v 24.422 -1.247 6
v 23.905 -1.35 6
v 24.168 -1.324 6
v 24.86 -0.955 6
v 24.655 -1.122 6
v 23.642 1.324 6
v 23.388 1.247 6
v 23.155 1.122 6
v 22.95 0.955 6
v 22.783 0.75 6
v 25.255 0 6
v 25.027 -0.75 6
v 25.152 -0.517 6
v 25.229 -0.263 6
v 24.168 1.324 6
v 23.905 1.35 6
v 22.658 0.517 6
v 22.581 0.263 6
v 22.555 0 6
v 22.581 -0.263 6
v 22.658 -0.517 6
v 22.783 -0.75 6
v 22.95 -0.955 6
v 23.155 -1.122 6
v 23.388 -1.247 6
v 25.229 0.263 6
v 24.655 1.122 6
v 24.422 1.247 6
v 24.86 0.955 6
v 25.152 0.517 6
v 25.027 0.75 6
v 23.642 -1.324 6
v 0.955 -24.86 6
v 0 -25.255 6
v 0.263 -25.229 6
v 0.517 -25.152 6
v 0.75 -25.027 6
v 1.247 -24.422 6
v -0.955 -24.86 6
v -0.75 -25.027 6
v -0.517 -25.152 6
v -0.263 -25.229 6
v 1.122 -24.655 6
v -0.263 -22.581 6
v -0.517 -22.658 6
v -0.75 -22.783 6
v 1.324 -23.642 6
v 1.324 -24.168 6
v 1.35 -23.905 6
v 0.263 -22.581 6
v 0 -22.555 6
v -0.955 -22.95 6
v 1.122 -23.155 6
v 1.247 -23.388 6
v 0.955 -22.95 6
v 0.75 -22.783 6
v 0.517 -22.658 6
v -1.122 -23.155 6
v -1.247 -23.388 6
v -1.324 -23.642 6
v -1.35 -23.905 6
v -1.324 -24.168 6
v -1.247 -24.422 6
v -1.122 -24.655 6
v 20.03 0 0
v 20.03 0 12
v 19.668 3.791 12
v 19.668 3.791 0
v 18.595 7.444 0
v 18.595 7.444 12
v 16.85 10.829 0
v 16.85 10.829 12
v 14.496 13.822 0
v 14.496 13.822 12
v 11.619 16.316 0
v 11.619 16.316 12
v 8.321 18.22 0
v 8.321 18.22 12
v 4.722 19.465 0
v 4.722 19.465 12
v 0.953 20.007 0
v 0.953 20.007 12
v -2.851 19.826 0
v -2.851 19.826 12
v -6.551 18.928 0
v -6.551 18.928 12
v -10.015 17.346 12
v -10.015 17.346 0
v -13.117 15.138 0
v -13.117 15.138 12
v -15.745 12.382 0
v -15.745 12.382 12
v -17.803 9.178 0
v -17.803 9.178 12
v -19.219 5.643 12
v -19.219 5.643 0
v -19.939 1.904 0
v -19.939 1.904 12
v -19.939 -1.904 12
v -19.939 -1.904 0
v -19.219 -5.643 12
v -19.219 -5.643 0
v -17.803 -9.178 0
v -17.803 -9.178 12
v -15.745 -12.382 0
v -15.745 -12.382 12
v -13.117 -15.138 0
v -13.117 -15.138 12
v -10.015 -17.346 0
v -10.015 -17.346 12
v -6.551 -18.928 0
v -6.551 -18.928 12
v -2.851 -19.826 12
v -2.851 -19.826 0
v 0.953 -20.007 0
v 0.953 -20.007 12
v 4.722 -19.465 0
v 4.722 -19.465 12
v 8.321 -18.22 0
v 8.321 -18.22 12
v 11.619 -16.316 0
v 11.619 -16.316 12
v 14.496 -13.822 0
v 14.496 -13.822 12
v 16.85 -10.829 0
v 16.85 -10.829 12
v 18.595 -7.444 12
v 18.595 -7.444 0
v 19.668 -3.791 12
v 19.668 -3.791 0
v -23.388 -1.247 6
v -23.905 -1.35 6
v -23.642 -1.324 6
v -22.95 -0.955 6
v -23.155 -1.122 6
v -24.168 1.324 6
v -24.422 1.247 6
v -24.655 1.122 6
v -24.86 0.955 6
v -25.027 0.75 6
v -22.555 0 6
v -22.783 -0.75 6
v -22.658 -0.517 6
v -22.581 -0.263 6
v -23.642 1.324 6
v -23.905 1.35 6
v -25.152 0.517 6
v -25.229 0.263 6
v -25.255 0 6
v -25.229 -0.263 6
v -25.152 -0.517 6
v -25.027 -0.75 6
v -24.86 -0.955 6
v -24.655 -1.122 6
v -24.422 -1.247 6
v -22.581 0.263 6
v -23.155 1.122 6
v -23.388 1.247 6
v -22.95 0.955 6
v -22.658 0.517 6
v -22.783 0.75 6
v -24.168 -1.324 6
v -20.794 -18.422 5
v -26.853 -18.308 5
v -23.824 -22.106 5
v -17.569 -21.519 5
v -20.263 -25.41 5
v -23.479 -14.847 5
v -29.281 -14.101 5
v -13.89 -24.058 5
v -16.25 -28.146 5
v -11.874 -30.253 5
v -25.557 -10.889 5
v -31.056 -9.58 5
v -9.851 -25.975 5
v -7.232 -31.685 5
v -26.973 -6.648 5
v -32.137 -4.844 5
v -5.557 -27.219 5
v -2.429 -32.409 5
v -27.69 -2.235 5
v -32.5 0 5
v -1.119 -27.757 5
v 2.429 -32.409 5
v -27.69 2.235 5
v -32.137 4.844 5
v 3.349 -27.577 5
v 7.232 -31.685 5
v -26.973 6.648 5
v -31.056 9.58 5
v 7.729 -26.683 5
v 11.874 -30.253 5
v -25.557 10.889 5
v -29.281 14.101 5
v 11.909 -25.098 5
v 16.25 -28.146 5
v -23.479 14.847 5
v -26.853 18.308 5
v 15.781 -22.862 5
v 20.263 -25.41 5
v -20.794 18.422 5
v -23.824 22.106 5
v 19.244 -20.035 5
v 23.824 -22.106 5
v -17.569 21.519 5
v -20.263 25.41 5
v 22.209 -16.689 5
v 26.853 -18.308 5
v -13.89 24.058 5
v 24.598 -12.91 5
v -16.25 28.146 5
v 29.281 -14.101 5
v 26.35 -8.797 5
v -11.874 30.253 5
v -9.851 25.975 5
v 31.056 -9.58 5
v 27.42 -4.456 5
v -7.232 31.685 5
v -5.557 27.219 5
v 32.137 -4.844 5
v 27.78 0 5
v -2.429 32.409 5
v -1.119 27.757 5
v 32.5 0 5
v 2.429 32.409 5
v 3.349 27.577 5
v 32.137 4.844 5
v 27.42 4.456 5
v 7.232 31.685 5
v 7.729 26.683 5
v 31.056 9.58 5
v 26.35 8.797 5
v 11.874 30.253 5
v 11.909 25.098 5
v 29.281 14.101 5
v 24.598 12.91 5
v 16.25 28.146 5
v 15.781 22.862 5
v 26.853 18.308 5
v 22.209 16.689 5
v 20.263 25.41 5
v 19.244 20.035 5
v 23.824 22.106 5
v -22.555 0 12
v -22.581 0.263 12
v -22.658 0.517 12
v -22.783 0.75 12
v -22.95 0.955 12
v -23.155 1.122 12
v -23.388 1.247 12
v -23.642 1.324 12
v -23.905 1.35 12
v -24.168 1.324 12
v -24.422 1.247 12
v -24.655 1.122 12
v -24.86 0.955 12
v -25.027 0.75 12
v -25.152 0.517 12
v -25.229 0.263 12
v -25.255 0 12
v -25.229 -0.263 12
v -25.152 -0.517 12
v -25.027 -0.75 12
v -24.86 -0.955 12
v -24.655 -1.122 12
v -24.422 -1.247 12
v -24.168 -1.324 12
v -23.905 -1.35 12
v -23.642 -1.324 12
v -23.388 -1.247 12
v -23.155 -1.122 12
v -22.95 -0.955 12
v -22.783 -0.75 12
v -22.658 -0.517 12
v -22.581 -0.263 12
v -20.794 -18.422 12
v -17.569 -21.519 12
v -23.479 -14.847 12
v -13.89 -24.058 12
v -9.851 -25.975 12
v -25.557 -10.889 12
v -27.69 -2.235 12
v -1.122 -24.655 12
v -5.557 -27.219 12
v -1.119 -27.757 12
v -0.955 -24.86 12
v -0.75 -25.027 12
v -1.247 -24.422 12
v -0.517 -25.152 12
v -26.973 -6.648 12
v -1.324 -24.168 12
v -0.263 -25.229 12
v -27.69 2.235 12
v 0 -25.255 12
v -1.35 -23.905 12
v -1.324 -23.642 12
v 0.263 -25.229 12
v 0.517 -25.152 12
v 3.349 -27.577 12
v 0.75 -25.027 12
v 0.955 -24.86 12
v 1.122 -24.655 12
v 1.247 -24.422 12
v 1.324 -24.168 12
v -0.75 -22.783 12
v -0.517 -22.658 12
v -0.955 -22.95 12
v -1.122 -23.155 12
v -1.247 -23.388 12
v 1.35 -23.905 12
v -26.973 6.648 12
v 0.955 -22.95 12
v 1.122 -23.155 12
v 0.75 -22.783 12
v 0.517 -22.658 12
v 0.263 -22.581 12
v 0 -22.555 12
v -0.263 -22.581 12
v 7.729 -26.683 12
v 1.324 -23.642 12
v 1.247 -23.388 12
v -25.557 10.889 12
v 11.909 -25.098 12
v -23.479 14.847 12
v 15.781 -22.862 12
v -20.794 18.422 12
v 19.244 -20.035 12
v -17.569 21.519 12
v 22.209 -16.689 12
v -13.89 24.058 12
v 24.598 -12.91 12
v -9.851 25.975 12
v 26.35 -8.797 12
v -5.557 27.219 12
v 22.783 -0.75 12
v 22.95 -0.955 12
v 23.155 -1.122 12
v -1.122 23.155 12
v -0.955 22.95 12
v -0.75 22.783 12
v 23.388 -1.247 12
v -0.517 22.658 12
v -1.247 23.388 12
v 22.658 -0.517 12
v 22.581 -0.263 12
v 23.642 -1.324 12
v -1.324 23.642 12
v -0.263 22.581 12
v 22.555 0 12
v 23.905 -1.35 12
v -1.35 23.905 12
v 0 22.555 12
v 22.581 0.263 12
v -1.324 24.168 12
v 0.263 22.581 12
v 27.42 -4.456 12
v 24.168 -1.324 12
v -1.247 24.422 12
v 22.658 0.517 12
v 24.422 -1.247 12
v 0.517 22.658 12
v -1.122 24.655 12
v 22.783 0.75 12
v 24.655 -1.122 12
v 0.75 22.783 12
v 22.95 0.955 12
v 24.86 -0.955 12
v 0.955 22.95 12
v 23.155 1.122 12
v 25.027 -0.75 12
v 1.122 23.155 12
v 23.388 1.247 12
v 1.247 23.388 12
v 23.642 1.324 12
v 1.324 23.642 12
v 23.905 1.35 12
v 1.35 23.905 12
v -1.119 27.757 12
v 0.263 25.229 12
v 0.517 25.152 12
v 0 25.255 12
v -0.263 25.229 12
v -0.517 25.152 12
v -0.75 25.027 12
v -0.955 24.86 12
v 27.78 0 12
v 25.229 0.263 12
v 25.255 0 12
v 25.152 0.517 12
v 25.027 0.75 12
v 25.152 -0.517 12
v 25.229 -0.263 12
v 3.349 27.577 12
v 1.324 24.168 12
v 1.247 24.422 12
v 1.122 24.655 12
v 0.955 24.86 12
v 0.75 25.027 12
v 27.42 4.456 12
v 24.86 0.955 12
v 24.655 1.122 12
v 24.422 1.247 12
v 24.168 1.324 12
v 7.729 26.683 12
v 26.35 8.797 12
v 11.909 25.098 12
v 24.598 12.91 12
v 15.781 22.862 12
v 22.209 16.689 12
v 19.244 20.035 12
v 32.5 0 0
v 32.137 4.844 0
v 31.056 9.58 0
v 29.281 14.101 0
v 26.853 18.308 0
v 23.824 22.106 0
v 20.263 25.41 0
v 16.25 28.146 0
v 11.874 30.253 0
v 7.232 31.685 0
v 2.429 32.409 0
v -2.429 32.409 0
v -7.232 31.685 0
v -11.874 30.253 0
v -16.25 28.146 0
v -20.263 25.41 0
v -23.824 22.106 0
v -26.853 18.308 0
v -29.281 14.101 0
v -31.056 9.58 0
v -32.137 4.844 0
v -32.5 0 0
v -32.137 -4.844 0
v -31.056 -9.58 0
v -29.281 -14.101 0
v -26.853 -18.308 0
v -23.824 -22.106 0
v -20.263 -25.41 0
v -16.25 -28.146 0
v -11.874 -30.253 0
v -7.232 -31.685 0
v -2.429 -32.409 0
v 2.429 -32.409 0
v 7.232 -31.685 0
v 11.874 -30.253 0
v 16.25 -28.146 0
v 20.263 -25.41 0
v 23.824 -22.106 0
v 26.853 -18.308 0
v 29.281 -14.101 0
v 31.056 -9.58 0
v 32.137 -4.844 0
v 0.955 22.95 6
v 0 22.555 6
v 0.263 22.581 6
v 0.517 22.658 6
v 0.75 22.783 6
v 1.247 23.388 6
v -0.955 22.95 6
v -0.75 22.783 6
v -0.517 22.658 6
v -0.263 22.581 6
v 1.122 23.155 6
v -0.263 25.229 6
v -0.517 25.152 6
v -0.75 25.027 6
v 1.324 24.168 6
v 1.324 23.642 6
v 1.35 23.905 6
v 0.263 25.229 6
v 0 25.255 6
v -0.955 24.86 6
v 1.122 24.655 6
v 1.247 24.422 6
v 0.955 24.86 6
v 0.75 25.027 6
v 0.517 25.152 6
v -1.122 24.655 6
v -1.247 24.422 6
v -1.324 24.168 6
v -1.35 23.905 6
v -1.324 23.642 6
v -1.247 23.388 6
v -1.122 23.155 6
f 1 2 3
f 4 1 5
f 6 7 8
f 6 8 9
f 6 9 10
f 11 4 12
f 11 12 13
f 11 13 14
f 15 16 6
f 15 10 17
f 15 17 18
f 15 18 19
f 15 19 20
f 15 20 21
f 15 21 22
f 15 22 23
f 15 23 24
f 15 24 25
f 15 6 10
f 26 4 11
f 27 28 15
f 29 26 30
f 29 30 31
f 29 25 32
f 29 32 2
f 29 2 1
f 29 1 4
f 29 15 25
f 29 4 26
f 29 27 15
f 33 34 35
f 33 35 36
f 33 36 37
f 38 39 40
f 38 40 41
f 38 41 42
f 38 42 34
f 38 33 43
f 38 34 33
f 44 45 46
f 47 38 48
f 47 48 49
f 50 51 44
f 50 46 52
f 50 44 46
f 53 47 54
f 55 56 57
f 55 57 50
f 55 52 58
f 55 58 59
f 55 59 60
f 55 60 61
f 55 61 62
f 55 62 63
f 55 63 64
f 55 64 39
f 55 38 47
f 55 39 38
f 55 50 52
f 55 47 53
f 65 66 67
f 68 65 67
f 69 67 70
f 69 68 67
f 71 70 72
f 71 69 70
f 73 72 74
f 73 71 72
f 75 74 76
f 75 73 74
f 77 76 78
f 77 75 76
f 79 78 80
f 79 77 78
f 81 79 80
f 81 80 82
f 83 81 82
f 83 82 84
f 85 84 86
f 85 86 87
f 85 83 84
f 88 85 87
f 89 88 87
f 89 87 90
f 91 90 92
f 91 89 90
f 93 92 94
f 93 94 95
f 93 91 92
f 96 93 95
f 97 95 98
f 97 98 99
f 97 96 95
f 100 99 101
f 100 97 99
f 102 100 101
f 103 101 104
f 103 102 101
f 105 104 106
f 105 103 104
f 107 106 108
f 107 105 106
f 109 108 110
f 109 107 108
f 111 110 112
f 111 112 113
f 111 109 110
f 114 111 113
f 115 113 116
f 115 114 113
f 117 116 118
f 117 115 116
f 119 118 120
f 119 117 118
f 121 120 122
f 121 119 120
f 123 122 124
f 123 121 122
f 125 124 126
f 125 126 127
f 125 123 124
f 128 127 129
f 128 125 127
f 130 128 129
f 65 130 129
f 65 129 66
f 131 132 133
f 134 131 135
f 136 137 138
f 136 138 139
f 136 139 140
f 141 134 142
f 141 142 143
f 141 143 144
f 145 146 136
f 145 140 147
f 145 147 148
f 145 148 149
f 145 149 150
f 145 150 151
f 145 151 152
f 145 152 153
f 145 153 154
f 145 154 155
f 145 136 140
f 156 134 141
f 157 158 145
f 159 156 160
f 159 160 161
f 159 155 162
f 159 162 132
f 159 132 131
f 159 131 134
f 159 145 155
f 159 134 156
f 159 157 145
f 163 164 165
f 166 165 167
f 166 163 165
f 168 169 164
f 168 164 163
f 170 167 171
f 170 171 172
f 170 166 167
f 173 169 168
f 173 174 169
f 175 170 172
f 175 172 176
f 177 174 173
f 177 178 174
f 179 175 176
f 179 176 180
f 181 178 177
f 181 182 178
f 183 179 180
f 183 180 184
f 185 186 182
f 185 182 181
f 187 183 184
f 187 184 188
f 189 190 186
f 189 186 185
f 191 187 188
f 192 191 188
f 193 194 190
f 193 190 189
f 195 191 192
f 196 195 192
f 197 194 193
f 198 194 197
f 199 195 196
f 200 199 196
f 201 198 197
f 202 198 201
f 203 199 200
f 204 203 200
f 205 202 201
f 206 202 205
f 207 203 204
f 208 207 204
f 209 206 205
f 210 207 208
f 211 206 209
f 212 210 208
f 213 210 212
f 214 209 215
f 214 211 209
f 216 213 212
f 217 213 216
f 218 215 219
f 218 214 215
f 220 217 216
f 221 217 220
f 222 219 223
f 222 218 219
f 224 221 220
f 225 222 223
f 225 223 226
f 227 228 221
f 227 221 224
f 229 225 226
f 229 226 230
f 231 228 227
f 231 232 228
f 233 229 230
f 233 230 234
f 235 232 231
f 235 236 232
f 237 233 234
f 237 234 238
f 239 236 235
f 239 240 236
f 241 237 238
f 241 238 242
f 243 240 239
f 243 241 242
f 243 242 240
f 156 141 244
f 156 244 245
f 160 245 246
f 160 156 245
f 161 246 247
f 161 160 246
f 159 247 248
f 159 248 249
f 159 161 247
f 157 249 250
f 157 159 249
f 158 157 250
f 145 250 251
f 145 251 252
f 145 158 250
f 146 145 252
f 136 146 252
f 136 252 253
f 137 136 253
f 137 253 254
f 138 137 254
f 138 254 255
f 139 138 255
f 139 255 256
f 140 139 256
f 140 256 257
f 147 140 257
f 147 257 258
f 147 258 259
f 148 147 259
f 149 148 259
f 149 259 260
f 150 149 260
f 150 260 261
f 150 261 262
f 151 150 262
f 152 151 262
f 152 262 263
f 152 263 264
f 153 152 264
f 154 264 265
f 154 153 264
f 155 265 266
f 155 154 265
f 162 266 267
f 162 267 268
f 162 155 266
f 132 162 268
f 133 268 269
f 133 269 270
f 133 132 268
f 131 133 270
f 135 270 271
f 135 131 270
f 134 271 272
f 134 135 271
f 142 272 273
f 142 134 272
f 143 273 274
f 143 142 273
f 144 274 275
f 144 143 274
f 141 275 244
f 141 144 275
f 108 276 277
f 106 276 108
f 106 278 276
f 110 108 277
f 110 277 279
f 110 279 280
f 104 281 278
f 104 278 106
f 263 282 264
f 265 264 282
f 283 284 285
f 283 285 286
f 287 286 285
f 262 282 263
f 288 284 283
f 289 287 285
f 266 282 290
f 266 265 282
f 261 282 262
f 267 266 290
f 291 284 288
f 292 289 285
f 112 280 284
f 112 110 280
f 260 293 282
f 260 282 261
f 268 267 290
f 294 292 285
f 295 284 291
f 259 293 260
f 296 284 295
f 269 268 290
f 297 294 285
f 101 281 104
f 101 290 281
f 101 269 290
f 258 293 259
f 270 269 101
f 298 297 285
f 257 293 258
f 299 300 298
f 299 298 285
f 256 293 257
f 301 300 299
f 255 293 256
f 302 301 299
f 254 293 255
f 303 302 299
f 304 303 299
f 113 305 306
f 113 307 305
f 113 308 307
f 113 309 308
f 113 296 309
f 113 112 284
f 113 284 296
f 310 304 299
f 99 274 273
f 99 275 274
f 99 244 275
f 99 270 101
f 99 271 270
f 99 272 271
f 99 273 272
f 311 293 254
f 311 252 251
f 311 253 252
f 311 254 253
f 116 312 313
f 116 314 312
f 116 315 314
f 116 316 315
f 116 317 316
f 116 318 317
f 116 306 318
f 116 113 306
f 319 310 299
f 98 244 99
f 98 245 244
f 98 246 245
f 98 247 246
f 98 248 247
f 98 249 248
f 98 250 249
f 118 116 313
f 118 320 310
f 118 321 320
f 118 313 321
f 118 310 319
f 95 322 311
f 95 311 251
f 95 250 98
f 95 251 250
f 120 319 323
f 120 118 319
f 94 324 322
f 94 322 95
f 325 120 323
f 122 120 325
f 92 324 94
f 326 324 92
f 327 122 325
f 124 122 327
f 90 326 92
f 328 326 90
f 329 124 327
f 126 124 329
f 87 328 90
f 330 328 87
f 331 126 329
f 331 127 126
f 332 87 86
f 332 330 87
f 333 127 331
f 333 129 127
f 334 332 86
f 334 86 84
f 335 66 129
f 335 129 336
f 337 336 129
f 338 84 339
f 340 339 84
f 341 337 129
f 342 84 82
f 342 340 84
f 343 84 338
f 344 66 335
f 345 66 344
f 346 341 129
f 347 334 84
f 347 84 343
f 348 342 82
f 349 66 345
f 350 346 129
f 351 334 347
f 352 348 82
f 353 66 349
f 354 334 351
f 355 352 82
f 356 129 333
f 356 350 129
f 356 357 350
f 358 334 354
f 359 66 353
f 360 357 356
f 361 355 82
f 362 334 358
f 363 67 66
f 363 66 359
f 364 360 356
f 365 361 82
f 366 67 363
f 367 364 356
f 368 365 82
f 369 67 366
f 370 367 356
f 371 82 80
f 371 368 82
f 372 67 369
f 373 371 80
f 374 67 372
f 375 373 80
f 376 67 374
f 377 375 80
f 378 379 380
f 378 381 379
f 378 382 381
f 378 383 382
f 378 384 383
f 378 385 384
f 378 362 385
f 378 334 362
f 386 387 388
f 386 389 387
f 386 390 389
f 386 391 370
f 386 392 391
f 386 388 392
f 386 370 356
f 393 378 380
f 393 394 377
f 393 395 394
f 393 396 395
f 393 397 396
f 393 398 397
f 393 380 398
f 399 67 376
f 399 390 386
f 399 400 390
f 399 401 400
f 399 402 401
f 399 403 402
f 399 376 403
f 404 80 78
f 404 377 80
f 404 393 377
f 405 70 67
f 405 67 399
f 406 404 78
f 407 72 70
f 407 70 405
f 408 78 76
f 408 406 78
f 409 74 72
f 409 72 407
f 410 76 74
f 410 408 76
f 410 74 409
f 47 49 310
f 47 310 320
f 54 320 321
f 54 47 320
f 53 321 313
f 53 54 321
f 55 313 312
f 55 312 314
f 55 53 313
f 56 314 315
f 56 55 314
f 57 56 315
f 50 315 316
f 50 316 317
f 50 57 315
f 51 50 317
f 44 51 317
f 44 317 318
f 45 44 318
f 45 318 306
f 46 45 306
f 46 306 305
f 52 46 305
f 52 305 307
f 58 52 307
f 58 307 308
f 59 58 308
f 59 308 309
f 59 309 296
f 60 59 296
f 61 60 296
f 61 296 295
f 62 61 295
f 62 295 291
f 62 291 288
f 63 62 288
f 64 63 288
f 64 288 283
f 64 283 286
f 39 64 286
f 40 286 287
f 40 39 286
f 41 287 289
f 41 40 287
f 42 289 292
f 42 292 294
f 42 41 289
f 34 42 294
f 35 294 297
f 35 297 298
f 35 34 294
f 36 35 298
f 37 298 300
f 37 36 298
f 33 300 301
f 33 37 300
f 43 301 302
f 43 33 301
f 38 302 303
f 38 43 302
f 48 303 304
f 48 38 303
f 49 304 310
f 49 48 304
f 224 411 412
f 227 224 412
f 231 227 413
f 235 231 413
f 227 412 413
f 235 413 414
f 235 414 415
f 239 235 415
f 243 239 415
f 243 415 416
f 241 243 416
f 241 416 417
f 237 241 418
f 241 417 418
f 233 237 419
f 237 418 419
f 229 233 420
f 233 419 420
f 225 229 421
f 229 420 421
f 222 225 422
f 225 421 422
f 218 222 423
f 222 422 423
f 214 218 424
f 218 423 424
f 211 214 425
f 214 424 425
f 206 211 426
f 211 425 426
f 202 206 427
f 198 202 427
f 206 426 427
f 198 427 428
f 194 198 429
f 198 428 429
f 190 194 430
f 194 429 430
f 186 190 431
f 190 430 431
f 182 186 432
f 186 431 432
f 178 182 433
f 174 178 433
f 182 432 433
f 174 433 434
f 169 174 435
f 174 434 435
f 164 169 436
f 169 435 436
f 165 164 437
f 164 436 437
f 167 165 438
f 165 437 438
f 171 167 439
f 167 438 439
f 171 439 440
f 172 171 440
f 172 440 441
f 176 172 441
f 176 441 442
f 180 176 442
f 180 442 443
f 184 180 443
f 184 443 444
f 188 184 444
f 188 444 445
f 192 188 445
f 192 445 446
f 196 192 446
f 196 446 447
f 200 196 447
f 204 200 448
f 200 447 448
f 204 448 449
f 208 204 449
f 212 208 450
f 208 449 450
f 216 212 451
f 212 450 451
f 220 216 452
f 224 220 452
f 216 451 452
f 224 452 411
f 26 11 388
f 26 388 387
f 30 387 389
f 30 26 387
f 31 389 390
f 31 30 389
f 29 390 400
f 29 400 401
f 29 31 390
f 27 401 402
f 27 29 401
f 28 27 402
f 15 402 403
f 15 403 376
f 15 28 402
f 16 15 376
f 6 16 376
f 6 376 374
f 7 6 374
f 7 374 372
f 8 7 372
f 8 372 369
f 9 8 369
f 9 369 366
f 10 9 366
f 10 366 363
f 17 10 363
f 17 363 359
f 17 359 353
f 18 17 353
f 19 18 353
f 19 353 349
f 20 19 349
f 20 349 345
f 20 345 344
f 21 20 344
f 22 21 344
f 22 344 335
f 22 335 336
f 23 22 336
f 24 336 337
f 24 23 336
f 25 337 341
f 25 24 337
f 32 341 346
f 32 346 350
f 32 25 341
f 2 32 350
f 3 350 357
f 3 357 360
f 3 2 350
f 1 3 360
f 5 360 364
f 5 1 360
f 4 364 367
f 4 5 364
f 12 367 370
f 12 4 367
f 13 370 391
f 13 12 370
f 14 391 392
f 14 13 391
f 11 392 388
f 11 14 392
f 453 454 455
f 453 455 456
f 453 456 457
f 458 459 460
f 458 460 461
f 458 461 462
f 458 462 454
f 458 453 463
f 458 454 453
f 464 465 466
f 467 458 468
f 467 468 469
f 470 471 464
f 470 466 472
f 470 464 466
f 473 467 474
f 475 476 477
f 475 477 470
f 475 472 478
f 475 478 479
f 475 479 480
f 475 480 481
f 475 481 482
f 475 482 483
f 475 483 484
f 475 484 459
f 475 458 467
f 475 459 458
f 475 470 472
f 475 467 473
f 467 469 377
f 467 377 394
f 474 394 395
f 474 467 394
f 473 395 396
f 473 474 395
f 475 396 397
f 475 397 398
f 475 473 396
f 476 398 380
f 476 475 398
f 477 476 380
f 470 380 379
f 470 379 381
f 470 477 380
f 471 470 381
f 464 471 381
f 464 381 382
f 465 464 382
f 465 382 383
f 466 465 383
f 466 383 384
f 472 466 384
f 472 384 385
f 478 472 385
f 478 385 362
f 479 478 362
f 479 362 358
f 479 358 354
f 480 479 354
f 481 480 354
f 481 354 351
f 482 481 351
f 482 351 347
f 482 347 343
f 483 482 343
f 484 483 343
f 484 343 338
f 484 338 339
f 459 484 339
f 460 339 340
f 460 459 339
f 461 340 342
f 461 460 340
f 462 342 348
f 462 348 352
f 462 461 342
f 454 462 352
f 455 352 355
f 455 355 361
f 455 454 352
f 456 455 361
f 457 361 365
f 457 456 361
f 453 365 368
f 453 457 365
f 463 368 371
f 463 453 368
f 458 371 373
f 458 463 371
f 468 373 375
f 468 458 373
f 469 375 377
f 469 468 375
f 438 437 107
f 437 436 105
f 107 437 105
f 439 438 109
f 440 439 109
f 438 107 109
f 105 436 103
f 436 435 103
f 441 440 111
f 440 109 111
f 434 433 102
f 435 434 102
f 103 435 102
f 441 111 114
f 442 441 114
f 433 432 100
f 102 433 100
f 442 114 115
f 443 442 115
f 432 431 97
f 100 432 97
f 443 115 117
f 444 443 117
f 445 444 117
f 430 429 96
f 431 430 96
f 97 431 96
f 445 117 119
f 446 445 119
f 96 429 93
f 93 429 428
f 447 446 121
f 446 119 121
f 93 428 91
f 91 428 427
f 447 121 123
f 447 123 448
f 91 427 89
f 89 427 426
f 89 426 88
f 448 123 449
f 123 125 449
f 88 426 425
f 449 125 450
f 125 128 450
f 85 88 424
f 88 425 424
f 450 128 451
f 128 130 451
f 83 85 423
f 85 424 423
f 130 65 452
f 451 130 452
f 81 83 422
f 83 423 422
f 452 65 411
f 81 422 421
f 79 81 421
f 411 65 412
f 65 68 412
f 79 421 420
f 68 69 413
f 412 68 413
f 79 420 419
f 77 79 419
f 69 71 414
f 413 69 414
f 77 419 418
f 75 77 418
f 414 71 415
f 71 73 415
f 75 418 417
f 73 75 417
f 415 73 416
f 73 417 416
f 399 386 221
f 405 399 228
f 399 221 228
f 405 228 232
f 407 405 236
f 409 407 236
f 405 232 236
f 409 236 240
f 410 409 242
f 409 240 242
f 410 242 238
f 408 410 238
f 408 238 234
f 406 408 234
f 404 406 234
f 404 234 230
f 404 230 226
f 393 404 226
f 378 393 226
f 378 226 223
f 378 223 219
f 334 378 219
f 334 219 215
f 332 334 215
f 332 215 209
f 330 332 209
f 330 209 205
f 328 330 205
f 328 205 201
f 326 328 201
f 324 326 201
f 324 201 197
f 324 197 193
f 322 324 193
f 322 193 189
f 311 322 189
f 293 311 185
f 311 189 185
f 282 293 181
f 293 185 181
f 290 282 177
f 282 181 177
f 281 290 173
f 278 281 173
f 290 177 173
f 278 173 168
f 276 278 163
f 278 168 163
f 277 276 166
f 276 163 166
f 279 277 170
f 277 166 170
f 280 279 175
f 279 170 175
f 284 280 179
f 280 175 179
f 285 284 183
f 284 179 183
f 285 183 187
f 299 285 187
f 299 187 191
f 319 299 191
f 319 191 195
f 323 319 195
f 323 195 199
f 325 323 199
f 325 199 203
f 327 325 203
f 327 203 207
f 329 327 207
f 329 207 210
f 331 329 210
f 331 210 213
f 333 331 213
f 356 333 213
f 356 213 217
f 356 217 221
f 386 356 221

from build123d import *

# Parameters (mm, degrees)
F0_R     = 32.5
F0_R_2   = 27.78
F1_DEPTH = 5
F0_R_3   = 1.35
F0_R_4   = 20.03
F2_DEPTH = 12
F3_DEPTH = 6


with BuildPart() as f1:
    # F0 (on Top) → F1 (new body)
    with BuildSketch(Plane.XY):
        Circle(F0_R)
        Circle(F0_R_2, mode=Mode.SUBTRACT)
    extrude(amount=F1_DEPTH)

    # F0 (on Top) → F2 (join)
    with BuildSketch(Plane.XY):
        Circle(F0_R_2)
        with Locations((0, -23.905)):
            Circle(F0_R_3, mode=Mode.SUBTRACT)
        with Locations((-23.905, 0)):
            Circle(F0_R_3, mode=Mode.SUBTRACT)
        Circle(F0_R_4, mode=Mode.SUBTRACT)
        with Locations((23.905, 0)):
            Circle(F0_R_3, mode=Mode.SUBTRACT)
        with Locations((0, 23.905)):
            Circle(F0_R_3, mode=Mode.SUBTRACT)
    extrude(amount=F2_DEPTH)

    # F0 (on Top) → F3 (join)
    with BuildSketch(Plane.XY):
        with Locations((-23.905, 0)):
            Circle(F0_R_3)
        with Locations((0, 23.905)):
            Circle(F0_R_3)
        with Locations((23.905, 0)):
            Circle(F0_R_3)
        with Locations((0, -23.905)):
            Circle(F0_R_3)
    extrude(amount=F3_DEPTH)


solid = f1.part
